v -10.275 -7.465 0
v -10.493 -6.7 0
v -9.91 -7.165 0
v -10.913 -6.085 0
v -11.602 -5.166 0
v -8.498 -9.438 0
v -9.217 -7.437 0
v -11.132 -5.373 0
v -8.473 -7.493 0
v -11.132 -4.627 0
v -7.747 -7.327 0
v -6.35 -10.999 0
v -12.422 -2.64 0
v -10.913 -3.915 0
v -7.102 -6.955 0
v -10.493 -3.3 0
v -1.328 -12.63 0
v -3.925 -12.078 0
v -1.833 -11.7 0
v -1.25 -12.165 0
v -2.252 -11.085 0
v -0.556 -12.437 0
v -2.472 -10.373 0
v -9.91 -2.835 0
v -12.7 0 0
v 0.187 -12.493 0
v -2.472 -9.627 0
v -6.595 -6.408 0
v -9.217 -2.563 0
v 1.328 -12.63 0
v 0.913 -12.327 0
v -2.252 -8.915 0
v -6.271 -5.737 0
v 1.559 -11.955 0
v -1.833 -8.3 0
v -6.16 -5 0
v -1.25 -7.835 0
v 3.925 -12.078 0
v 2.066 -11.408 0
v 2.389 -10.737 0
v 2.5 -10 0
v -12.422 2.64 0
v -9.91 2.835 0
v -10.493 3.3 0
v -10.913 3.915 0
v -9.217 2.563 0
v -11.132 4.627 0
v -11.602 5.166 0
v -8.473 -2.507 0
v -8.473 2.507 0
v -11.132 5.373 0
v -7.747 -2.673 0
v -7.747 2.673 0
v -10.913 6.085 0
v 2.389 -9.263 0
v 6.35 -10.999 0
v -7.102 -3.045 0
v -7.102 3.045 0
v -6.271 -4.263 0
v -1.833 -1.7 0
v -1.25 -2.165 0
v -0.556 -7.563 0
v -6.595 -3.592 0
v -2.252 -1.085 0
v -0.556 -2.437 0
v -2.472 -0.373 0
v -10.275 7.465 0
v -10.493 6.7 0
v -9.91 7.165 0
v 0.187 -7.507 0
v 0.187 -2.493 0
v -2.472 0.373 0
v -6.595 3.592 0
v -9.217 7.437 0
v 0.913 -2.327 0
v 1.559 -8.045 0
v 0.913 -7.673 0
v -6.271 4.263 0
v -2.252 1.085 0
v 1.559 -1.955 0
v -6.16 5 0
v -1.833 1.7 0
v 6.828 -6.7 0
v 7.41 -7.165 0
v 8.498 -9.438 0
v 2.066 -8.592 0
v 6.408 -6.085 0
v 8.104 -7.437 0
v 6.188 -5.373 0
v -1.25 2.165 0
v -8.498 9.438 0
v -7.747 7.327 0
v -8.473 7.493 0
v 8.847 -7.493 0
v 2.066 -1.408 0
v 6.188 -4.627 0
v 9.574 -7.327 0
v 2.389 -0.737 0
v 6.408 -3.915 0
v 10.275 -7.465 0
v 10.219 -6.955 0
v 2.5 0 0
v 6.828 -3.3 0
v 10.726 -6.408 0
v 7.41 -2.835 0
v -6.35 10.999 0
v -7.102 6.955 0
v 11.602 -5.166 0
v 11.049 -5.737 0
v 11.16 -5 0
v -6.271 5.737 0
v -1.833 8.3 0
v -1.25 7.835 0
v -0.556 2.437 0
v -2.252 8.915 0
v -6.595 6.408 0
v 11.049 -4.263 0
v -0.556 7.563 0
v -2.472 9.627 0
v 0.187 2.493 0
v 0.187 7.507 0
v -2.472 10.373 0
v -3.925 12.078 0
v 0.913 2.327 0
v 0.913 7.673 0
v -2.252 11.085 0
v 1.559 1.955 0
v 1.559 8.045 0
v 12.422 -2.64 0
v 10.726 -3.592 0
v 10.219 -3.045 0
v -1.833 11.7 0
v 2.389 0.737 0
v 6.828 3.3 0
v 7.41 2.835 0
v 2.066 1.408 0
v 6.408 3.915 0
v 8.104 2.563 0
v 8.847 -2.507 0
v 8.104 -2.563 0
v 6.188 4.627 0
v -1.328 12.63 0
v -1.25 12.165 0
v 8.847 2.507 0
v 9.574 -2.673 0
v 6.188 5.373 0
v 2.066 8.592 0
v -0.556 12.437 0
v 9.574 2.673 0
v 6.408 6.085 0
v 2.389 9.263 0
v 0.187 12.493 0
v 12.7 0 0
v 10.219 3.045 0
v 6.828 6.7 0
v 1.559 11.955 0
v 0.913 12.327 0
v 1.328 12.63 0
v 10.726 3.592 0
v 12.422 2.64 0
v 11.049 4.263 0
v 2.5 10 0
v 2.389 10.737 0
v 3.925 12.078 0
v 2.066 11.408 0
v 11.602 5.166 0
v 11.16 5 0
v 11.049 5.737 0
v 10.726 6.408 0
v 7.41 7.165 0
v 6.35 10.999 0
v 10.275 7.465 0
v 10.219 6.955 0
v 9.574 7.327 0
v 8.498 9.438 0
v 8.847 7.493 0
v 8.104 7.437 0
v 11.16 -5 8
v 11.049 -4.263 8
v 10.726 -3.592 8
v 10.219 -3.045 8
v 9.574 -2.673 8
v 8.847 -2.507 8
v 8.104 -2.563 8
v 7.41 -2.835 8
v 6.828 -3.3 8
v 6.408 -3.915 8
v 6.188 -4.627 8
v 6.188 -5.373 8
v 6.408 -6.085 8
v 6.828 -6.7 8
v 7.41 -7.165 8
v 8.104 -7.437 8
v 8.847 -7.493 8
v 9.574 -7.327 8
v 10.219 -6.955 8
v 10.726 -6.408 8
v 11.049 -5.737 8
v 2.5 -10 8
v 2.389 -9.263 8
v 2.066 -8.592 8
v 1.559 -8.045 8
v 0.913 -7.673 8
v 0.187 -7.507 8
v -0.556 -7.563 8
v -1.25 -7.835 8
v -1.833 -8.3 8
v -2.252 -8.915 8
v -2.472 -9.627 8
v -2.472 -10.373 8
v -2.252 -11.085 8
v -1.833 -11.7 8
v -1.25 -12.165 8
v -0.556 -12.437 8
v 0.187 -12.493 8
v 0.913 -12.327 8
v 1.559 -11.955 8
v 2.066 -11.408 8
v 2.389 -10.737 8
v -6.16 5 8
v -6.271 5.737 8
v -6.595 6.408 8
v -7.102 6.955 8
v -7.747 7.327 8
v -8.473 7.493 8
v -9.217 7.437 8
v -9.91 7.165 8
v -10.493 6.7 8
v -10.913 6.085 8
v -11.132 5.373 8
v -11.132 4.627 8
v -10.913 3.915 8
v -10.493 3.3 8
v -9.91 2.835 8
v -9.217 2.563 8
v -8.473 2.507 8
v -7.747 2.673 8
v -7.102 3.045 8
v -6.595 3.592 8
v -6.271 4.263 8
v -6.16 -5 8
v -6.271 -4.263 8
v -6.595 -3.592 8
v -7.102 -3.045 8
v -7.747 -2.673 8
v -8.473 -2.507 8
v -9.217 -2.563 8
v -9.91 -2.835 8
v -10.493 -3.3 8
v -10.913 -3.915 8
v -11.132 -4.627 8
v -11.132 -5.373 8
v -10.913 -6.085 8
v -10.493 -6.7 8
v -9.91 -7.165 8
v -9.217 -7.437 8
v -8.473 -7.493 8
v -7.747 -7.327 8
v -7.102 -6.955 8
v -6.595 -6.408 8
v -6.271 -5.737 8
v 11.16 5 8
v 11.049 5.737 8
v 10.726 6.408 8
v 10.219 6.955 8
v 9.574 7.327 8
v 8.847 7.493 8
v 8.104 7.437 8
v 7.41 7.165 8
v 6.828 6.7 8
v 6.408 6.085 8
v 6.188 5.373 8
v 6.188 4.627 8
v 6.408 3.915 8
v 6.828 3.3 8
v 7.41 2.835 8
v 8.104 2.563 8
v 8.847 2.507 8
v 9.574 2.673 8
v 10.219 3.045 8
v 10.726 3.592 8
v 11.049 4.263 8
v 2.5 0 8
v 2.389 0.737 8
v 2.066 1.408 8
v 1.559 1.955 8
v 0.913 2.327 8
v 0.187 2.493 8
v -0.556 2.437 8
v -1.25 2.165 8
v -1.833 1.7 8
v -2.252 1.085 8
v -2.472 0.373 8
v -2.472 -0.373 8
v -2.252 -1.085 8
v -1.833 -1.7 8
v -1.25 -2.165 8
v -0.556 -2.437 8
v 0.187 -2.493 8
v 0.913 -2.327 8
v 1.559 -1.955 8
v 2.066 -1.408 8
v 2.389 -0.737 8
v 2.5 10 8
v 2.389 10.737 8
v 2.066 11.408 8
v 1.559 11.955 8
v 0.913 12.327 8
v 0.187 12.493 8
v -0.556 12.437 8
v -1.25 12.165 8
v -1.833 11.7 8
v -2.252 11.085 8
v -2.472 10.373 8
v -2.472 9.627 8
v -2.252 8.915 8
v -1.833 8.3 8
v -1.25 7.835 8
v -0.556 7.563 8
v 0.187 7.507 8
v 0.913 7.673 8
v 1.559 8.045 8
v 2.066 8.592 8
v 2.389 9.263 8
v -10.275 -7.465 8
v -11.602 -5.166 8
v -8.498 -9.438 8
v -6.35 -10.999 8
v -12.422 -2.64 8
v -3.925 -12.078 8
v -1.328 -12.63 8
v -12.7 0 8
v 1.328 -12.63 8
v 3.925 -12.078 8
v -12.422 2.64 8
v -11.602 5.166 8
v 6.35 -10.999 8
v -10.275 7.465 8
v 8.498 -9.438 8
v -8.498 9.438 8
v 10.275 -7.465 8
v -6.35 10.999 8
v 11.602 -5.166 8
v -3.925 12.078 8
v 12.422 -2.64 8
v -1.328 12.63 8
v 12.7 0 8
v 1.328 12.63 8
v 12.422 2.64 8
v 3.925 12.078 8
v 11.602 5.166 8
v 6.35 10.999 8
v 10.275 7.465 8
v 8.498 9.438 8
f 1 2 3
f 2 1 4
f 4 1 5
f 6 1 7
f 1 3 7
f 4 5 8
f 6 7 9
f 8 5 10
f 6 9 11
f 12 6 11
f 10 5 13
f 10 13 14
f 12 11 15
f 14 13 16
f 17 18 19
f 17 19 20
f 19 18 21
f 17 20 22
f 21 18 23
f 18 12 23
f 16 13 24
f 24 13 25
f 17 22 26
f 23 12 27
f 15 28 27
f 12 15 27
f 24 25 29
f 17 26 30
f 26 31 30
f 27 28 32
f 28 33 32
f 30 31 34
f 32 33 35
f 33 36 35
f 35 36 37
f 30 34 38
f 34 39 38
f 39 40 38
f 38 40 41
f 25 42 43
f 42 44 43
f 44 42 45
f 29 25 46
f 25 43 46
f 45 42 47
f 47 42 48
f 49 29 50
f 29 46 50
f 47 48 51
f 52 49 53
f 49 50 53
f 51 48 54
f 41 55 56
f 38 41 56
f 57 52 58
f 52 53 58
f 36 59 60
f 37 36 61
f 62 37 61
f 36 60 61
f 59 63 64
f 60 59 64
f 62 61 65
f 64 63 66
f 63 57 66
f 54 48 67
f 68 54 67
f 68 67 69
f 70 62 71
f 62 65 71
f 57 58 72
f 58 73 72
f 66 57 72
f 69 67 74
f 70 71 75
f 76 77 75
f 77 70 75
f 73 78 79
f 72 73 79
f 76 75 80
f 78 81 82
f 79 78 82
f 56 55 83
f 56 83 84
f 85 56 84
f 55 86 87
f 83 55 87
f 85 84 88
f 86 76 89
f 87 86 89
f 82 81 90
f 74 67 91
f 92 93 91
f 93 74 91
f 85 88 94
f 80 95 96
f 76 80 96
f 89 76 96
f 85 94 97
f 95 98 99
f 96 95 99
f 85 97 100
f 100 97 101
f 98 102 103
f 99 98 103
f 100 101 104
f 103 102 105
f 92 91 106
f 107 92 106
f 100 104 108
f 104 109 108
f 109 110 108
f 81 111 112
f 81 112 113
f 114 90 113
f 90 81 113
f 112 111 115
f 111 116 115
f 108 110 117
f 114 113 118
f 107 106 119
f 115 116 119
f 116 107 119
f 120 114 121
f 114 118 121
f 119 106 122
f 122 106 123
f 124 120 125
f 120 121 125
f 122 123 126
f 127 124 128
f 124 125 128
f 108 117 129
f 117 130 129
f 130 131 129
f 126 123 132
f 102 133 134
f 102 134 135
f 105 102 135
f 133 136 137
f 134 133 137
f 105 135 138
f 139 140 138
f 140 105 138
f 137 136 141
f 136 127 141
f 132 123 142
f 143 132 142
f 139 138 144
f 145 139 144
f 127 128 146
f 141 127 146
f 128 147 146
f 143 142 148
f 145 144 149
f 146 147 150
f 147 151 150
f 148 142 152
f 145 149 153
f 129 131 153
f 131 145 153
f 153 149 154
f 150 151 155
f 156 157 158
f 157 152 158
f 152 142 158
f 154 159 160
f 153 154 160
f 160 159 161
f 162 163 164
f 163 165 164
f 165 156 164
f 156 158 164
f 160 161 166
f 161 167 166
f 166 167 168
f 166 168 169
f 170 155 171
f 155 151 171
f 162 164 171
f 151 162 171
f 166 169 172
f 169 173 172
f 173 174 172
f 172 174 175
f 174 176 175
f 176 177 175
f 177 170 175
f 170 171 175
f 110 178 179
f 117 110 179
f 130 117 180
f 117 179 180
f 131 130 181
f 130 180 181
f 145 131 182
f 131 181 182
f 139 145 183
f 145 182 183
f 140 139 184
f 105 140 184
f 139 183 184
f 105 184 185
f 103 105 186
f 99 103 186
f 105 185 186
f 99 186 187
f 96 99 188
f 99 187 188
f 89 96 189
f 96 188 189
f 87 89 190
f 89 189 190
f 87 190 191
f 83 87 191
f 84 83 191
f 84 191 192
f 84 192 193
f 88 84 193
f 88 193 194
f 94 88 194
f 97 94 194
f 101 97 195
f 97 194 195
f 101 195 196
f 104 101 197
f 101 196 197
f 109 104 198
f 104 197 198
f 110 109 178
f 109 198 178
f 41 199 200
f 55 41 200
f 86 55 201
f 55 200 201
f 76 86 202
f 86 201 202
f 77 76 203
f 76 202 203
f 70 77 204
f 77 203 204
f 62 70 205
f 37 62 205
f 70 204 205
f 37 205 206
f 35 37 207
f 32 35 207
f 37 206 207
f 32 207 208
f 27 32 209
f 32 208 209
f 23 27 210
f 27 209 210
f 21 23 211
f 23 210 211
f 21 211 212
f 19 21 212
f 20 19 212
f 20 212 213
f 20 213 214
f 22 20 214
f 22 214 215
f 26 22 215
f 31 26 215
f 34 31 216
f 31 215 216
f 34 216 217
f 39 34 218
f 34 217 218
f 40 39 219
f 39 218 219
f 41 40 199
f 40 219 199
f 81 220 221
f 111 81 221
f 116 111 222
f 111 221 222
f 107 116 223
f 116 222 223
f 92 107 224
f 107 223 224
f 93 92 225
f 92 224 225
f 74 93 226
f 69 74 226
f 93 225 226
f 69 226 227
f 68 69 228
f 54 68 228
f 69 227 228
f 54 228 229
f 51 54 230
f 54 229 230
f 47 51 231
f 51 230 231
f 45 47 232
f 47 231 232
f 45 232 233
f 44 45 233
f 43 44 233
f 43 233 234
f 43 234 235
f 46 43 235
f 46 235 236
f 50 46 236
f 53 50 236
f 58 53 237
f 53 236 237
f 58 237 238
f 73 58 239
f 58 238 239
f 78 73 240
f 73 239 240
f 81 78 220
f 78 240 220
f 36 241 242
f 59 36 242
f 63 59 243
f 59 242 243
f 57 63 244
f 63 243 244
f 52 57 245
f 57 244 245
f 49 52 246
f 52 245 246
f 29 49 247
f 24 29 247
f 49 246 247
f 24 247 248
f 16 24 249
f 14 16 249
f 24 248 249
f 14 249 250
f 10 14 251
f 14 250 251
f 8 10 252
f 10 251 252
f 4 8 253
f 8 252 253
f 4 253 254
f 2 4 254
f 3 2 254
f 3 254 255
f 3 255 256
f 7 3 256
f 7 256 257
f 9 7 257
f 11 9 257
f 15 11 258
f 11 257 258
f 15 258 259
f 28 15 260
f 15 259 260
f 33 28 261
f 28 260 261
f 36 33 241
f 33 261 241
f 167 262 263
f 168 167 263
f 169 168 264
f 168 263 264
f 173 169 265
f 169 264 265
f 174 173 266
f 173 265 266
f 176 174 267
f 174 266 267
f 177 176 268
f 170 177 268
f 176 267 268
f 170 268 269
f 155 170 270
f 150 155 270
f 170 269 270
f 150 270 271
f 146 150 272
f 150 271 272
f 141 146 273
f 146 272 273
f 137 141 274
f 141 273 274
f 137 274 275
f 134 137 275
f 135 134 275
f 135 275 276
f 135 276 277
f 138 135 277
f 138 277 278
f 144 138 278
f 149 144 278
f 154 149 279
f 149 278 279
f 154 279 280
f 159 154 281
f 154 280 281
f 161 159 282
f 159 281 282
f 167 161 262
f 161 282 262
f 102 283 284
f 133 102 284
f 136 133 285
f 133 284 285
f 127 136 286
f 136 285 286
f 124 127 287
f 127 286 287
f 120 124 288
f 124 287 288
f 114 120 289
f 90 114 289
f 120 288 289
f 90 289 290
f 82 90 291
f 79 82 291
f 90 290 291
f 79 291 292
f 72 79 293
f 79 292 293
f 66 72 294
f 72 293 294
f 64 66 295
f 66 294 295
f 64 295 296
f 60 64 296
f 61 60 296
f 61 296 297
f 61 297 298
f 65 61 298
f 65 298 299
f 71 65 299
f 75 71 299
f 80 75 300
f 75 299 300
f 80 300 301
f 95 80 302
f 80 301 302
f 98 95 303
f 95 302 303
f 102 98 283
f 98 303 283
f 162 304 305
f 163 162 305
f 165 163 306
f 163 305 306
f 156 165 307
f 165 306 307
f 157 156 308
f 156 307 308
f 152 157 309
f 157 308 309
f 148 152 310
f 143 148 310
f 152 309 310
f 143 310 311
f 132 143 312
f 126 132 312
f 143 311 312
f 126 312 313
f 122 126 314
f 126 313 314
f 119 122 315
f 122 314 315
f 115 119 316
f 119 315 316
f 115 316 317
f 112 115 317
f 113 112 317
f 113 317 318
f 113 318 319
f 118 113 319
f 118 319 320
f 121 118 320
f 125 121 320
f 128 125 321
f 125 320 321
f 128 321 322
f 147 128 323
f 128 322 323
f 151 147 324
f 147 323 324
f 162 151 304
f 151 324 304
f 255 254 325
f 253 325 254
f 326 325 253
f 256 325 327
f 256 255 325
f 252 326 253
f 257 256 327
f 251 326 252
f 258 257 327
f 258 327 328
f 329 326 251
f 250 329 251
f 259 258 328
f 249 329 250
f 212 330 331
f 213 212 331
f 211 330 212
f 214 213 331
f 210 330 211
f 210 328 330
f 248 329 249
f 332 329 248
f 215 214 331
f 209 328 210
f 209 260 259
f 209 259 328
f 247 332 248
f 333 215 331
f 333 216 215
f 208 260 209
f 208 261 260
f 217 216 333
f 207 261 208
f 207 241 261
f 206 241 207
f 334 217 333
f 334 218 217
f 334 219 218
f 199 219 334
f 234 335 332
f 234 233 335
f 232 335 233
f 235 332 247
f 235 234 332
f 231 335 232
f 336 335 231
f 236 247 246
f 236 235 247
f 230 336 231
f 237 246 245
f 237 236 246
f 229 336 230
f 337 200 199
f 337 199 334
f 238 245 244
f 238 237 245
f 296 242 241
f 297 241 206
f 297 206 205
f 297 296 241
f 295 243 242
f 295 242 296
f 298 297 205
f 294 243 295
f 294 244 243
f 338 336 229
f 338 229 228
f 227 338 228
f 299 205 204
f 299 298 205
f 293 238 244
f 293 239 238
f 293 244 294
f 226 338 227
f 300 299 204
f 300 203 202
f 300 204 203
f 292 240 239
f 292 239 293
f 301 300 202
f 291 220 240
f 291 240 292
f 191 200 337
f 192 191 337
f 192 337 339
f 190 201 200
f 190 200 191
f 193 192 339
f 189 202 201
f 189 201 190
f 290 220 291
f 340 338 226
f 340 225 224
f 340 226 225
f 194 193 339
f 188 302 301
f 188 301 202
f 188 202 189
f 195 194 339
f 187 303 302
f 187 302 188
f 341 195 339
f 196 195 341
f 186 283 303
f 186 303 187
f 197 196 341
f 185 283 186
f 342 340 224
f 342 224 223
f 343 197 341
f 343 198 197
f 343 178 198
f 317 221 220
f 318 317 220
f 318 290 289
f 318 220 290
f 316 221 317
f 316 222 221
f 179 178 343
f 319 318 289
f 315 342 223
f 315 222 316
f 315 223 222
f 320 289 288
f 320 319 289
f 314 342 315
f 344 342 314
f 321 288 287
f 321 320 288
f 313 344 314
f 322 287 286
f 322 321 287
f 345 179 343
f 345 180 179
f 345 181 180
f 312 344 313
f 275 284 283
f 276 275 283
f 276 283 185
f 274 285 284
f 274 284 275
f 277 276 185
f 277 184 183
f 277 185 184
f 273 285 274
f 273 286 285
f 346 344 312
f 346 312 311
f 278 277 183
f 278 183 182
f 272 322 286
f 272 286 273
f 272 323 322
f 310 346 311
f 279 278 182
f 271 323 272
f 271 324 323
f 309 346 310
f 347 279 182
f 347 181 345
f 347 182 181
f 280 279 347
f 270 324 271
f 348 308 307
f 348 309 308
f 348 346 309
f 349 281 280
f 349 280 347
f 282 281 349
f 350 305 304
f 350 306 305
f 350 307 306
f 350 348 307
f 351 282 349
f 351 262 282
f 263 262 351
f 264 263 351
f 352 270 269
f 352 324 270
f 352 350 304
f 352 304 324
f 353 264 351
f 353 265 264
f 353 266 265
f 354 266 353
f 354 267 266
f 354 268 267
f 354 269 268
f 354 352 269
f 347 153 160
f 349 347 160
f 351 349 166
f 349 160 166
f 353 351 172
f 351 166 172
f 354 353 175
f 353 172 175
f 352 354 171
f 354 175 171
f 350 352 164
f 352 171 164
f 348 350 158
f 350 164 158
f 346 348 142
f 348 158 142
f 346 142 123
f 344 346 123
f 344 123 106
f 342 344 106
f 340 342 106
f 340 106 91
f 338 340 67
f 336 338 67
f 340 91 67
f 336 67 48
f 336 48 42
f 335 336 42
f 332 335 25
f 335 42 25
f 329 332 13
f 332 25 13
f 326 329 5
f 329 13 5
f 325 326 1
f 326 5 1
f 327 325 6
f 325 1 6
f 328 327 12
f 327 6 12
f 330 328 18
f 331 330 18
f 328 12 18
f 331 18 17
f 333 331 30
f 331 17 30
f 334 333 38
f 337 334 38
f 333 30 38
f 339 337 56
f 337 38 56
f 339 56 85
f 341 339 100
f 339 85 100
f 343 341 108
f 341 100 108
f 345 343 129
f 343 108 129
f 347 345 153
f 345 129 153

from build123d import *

# Parameters (mm, degrees)
SKETCH1_R           = 12.7
BOSS_EXTRUDE1_DEPTH = 8
SKETCH2_R           = 2.5
CUT_EXTRUDE1_DEPTH  = 8


with BuildPart() as part:
    # Sketch1 → Boss-Extrude1 (new body)
    with BuildSketch(Plane.XY):
        Circle(SKETCH1_R)
    extrude(amount=BOSS_EXTRUDE1_DEPTH)

    # Sketch2 → Cut-Extrude1 (cut)
    with BuildSketch(Plane.XY.offset(8)):
        with Locations((0, 10)):
            Circle(SKETCH2_R)
        with Locations((8.660254038, 5)):
            Circle(SKETCH2_R)
        with Locations((8.660254038, -5)):
            Circle(SKETCH2_R)
        with Locations((0, -10)):
            Circle(SKETCH2_R)
        with Locations((-8.660254038, -5)):
            Circle(SKETCH2_R)
        with Locations((-8.660254038, 5)):
            Circle(SKETCH2_R)
        Circle(SKETCH2_R)
    extrude(amount=-CUT_EXTRUDE1_DEPTH, mode=Mode.SUBTRACT)


solid = part.part
